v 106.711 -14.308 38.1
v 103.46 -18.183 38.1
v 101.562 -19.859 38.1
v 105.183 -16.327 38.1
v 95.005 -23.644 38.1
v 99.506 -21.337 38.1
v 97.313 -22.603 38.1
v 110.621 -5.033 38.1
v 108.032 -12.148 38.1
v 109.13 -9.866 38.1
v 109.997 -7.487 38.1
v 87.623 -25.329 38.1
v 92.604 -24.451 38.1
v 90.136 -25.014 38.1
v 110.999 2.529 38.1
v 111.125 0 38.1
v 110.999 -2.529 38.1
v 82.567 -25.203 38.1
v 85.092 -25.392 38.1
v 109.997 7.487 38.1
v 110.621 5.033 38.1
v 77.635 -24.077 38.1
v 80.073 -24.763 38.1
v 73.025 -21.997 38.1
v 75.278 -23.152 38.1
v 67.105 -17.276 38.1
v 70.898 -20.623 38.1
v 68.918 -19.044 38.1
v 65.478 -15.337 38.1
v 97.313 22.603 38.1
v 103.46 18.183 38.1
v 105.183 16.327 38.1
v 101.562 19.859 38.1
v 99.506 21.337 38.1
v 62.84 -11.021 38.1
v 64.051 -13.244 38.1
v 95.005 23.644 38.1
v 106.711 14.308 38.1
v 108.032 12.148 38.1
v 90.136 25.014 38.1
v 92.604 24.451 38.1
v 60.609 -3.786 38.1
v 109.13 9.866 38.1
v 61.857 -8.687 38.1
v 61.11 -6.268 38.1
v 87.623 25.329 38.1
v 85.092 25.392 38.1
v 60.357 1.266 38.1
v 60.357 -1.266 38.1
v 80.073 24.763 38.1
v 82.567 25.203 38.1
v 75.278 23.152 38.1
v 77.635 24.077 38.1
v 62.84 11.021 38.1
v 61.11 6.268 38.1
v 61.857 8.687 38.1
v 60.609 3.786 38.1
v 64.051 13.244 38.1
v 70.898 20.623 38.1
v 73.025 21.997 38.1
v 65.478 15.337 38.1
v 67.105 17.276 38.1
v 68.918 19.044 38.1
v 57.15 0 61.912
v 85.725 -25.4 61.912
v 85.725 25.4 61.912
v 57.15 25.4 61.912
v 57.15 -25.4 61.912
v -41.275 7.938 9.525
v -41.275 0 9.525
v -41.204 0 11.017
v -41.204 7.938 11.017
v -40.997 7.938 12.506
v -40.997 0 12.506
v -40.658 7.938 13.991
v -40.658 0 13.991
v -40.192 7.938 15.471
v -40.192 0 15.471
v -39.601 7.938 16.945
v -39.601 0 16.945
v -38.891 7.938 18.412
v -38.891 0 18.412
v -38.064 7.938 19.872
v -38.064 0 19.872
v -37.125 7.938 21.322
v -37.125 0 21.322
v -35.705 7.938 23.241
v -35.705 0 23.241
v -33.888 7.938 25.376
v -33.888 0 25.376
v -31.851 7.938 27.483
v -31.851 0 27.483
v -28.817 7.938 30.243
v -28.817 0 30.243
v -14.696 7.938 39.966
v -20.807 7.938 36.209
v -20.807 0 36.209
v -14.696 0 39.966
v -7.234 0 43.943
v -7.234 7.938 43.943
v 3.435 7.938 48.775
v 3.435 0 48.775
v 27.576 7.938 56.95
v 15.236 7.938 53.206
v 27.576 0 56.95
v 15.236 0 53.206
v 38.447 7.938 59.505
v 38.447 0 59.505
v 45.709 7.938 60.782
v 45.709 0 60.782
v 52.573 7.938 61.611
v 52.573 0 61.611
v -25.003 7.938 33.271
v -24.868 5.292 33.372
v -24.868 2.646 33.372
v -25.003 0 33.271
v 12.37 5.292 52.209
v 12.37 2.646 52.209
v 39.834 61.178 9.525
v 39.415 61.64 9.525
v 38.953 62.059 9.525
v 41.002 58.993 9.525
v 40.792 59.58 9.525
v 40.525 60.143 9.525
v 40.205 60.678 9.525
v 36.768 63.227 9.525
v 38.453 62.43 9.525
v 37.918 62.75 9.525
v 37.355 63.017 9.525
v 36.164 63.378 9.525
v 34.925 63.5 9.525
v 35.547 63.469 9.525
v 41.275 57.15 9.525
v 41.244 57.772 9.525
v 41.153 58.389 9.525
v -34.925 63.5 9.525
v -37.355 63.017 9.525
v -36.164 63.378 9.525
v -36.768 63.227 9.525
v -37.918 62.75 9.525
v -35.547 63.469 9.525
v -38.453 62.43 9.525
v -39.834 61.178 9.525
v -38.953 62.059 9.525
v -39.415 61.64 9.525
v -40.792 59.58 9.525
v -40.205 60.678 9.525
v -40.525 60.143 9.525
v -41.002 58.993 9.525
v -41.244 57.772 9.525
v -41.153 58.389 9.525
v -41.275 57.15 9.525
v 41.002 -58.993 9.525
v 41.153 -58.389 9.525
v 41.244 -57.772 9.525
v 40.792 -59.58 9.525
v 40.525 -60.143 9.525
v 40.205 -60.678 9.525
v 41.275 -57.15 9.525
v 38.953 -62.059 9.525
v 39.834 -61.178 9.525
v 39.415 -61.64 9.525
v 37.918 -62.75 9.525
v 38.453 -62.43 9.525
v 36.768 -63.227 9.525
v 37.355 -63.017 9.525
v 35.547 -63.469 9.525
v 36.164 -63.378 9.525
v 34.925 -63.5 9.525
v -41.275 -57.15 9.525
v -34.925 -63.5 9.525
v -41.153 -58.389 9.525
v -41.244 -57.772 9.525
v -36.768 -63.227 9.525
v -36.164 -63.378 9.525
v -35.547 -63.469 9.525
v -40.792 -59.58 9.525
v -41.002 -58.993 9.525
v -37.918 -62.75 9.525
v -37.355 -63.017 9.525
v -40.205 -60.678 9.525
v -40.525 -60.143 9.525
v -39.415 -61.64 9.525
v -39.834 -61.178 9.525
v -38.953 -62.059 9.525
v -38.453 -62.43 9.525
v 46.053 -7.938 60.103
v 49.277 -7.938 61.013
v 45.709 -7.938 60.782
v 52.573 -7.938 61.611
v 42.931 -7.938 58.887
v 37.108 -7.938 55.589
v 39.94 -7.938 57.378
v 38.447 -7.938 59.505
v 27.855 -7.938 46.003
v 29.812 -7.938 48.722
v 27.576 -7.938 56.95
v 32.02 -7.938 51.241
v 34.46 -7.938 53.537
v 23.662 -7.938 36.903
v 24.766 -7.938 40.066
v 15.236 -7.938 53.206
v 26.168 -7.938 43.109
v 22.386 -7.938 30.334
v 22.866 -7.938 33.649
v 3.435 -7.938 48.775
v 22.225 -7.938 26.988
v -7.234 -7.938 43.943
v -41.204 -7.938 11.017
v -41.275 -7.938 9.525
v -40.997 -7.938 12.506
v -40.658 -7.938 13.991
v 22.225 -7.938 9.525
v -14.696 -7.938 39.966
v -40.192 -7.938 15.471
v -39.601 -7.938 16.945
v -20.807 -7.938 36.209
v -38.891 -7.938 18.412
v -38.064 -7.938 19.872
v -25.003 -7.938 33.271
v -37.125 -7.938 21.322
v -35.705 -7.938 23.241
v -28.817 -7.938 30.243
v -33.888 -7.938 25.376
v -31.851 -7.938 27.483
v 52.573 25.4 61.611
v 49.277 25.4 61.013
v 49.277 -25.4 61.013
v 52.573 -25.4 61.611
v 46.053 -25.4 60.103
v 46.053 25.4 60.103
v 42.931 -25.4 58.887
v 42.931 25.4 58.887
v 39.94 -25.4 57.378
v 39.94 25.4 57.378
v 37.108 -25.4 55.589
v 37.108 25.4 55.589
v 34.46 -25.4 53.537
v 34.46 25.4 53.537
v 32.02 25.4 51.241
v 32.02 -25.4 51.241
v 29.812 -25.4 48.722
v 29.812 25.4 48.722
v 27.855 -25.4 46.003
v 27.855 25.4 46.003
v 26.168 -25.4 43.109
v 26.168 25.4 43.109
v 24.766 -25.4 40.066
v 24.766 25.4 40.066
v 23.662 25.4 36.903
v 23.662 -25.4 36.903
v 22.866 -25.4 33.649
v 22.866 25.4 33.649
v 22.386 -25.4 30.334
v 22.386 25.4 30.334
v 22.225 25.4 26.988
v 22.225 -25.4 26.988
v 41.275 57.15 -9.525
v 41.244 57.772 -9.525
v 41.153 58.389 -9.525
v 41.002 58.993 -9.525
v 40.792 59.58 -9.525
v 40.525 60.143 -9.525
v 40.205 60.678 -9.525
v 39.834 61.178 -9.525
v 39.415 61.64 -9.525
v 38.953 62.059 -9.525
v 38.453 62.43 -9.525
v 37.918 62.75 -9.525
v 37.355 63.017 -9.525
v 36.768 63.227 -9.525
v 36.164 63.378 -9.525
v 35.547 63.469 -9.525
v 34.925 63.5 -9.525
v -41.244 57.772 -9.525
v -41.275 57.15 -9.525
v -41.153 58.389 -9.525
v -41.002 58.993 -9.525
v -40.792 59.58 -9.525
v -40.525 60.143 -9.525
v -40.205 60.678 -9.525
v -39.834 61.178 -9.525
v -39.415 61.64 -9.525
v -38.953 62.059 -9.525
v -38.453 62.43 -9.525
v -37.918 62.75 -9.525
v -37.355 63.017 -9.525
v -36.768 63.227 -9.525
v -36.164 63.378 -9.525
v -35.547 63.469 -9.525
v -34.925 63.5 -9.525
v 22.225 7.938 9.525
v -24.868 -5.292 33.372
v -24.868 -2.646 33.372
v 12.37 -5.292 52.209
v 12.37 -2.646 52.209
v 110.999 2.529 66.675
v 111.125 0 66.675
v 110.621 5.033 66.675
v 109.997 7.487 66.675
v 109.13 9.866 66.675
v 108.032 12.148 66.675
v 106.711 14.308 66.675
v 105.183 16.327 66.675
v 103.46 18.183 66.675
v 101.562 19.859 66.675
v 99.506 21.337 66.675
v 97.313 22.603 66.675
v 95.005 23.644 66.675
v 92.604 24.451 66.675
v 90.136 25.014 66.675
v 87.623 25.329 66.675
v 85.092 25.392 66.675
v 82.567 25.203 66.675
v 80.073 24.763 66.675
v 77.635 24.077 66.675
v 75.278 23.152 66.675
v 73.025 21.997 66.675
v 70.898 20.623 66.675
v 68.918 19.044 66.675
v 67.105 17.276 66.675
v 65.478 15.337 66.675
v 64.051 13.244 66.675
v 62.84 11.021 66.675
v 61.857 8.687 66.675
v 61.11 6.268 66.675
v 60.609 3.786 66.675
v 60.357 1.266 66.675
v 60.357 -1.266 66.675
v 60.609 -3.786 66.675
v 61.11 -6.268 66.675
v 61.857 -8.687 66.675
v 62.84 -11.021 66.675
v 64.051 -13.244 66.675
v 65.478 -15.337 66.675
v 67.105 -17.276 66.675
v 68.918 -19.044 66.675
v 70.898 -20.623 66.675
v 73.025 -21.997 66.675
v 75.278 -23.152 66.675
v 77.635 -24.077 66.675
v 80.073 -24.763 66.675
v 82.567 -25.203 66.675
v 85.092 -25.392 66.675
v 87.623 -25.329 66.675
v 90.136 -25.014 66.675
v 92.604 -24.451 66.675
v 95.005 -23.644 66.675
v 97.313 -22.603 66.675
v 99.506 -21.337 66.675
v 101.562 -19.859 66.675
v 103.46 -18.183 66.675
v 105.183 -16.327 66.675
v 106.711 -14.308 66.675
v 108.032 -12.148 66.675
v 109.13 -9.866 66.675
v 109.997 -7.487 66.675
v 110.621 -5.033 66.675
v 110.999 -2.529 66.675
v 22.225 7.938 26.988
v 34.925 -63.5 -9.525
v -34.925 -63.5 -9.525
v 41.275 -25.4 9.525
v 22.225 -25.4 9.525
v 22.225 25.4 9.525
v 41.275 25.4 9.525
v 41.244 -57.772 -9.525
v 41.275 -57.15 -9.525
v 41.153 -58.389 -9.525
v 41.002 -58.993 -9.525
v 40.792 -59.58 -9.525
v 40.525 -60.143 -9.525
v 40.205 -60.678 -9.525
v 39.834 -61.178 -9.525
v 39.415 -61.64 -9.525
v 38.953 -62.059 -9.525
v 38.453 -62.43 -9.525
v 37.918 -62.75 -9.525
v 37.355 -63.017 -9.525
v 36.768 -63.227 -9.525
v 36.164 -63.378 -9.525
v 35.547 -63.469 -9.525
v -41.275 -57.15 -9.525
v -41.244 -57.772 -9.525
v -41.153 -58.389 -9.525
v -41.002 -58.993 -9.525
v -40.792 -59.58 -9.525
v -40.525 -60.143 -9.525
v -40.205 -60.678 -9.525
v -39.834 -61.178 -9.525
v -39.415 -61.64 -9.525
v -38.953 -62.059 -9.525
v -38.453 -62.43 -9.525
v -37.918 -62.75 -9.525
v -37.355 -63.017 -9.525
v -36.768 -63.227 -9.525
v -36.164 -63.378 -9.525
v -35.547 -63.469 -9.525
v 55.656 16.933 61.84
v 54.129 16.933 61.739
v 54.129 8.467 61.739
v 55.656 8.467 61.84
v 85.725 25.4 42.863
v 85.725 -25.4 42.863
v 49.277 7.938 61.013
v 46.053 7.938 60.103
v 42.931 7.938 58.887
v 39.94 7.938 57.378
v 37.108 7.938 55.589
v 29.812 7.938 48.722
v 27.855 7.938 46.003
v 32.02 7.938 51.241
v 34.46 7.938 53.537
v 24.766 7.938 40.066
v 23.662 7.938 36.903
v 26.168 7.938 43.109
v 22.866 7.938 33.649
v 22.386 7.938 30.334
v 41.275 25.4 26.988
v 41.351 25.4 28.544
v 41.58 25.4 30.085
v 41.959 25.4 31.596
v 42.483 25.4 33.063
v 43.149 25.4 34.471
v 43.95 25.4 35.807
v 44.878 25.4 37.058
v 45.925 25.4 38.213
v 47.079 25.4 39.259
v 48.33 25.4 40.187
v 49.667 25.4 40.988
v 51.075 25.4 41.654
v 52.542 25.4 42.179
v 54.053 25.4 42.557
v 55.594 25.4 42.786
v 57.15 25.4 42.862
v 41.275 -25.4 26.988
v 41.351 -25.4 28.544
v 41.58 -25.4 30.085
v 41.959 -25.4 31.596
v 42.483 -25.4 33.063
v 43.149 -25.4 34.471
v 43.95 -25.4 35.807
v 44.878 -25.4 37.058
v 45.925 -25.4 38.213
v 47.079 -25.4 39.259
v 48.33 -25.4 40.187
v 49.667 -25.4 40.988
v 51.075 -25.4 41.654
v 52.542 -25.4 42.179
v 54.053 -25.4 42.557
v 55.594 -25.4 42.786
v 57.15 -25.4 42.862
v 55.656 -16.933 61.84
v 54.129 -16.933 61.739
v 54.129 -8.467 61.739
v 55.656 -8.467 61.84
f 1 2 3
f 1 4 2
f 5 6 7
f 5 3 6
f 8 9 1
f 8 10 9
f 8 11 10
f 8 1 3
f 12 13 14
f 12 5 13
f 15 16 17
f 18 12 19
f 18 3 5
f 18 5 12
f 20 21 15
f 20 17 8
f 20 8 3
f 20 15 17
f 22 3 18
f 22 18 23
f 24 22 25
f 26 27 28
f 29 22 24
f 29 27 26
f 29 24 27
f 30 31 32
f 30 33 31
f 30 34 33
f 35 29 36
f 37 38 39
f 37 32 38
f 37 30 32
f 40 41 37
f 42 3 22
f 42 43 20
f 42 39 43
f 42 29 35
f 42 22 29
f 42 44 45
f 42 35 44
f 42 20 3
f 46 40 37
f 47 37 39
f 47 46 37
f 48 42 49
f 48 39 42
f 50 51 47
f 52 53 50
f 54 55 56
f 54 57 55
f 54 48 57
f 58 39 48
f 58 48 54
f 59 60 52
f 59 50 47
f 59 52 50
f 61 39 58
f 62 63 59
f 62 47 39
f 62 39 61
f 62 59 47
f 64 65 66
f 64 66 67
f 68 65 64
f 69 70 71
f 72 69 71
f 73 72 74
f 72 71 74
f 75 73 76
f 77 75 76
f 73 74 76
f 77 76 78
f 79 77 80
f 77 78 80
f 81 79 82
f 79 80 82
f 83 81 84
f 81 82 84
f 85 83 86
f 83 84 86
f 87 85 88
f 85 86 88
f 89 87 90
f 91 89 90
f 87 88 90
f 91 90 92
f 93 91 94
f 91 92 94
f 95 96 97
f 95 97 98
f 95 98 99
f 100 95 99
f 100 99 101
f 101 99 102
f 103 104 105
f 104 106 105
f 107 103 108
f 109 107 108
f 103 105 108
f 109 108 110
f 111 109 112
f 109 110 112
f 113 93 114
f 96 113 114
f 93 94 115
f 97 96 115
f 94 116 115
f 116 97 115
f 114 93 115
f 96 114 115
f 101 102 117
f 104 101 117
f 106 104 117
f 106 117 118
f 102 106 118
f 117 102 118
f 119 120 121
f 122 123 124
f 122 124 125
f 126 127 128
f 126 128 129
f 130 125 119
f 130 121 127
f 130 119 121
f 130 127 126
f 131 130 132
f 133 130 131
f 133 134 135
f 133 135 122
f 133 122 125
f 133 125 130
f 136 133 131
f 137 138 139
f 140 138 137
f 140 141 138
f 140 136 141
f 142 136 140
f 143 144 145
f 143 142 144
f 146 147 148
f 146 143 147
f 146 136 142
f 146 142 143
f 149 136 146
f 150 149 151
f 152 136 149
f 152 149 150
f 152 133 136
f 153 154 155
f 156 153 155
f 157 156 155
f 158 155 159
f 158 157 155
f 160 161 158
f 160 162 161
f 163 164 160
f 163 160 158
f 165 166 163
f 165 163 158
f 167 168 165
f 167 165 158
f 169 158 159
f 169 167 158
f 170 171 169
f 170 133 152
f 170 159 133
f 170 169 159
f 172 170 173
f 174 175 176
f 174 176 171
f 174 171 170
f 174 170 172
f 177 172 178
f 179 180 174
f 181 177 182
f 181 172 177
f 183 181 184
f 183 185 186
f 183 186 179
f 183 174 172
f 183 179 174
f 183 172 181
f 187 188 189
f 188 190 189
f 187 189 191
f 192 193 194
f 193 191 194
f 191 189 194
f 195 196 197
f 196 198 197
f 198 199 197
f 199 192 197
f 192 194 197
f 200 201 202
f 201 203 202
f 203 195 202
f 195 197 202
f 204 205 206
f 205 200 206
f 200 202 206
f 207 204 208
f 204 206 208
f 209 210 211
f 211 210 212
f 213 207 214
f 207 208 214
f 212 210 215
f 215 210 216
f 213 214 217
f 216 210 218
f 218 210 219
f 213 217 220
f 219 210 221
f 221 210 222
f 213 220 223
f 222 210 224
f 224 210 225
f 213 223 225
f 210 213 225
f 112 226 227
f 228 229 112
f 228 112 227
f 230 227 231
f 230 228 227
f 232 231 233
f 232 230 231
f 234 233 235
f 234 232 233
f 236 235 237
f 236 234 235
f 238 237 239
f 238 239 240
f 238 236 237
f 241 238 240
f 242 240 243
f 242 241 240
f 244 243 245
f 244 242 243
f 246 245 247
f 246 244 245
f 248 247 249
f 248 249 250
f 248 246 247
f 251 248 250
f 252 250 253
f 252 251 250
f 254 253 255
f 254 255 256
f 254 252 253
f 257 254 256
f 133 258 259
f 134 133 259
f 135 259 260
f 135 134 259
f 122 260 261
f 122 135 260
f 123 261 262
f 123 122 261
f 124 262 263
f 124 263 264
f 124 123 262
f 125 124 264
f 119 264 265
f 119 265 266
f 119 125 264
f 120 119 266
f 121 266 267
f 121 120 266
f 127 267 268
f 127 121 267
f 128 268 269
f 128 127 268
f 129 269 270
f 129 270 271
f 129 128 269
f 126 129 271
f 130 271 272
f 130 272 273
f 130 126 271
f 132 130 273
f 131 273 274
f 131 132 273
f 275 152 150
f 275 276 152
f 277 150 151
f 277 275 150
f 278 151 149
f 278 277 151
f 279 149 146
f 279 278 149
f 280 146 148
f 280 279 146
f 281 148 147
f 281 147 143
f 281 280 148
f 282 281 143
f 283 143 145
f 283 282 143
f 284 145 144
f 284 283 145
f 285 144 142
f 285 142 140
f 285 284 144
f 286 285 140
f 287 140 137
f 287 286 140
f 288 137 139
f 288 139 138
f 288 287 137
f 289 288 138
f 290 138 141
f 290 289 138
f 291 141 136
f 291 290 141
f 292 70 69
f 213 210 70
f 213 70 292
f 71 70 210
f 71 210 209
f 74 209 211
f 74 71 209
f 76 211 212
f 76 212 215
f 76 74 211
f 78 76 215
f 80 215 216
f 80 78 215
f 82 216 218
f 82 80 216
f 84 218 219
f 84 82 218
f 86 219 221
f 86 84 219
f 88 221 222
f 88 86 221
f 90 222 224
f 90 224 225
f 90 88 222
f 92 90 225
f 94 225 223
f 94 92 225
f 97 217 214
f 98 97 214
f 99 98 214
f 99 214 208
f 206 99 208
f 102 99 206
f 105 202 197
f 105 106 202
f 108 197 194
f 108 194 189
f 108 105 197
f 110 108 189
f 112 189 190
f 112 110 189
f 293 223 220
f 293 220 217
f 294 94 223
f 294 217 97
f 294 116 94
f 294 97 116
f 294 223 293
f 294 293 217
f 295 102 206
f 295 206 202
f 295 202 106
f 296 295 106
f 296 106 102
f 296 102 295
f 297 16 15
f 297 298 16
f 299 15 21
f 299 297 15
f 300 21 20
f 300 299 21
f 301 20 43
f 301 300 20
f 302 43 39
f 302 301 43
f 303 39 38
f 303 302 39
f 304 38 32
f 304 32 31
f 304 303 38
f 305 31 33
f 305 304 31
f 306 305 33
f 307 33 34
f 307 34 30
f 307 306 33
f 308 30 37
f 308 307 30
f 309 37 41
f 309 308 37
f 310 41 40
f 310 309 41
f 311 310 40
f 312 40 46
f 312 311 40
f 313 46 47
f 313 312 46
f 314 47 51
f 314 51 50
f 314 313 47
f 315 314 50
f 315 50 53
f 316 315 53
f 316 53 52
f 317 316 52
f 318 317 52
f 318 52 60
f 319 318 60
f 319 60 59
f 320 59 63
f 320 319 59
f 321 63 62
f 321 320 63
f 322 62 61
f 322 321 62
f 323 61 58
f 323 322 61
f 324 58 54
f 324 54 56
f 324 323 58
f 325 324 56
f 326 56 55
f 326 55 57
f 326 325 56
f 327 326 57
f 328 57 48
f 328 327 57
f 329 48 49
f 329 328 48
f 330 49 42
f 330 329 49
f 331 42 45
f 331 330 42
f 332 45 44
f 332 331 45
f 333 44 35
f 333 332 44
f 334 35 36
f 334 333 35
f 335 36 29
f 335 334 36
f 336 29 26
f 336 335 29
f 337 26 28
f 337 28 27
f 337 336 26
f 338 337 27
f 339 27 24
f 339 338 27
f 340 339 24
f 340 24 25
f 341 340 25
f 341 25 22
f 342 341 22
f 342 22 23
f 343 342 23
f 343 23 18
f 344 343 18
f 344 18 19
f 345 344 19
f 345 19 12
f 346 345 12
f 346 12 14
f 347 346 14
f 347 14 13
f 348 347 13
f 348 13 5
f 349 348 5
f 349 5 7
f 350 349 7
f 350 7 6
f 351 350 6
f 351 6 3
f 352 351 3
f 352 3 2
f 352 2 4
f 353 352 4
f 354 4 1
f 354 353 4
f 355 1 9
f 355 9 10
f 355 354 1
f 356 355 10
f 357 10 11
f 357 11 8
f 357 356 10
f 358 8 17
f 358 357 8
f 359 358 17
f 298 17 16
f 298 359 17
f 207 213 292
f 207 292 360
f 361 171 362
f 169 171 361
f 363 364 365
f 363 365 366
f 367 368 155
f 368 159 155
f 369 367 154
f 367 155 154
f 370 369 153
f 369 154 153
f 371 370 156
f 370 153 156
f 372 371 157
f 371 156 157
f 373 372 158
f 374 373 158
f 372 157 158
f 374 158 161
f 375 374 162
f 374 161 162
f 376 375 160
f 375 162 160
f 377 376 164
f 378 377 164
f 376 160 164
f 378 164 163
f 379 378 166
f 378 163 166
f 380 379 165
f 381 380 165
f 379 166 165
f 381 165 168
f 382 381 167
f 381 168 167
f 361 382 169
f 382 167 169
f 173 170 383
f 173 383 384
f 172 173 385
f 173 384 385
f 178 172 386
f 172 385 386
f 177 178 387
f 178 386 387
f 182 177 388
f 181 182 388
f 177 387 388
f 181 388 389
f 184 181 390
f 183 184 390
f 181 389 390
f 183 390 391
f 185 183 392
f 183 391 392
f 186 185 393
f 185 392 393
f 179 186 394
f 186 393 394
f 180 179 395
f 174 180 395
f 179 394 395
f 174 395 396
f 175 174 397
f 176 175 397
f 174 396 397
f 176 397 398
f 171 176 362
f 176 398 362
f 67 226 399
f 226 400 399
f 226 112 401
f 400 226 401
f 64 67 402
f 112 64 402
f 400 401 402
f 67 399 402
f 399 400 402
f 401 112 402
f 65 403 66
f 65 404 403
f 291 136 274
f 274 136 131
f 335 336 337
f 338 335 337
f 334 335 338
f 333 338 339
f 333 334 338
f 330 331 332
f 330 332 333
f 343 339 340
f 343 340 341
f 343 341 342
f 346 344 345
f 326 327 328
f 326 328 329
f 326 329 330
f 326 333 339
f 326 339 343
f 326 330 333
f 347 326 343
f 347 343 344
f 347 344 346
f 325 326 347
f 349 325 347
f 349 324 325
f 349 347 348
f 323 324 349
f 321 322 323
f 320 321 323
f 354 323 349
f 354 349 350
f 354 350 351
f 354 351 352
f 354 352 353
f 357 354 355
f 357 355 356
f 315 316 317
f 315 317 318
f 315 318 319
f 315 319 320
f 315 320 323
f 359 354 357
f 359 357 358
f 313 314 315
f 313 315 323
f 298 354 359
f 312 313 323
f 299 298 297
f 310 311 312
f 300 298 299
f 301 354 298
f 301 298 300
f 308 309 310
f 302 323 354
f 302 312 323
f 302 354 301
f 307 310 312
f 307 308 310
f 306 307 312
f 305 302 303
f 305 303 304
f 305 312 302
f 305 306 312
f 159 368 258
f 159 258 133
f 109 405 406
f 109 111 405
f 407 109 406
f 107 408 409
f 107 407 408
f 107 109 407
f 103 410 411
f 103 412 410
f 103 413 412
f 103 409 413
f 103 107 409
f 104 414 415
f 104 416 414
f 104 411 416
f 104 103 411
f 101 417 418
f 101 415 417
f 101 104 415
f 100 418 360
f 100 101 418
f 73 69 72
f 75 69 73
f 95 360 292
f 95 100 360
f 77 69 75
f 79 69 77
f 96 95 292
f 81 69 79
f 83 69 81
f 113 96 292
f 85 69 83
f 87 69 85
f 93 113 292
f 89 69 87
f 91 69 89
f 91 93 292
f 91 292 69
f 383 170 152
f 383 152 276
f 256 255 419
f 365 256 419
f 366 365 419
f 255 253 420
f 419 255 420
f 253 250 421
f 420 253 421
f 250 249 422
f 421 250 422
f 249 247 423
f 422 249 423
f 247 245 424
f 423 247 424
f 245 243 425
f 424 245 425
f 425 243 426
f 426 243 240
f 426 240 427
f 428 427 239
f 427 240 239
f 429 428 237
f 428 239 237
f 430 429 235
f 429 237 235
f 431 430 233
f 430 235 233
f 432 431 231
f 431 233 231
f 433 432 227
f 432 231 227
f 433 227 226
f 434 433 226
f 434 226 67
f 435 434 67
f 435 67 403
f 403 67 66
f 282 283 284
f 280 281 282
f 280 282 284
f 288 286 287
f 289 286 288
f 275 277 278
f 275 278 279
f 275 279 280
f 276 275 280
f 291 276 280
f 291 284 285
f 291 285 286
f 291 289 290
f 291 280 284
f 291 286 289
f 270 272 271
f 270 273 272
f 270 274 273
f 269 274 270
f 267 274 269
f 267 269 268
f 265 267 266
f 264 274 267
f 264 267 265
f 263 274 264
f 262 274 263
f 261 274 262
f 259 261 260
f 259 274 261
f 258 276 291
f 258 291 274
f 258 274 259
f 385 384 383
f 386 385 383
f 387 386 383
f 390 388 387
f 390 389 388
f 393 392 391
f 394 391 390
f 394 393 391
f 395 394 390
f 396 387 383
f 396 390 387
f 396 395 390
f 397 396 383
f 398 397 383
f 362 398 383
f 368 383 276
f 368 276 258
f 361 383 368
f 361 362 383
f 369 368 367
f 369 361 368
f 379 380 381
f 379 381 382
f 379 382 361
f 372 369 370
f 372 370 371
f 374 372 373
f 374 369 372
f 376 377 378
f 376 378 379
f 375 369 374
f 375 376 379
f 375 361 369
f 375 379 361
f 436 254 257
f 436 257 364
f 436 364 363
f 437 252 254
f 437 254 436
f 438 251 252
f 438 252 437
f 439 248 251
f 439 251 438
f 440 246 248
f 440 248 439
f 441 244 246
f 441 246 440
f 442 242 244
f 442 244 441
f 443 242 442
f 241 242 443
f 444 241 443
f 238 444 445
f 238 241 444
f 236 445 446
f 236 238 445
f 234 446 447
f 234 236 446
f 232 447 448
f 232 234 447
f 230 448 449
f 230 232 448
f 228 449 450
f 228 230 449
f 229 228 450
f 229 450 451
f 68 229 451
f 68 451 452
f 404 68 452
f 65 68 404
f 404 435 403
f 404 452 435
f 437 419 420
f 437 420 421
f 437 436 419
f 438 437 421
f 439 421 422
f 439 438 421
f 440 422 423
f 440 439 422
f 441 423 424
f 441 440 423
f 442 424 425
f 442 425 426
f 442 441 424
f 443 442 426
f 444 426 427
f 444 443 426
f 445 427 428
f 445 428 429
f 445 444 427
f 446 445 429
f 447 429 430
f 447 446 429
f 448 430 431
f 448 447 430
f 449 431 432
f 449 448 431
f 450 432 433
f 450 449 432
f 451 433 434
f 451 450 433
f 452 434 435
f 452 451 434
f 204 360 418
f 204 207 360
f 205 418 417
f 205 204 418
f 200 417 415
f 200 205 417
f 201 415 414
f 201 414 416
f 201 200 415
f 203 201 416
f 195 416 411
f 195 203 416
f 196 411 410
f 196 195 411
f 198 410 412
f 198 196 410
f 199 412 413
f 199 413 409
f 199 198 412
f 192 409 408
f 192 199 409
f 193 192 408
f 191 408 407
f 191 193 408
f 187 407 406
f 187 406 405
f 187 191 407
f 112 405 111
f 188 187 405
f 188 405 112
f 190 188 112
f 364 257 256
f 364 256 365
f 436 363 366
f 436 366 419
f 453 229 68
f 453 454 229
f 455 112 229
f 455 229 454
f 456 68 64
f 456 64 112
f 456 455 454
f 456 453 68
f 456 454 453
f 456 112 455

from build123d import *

# Parameters (mm, degrees)
F1_DEPTH = 63.5
F3_DEPTH = 7.9375
F0_W     = 25.4
F0_H     = 19.05
F4_DEPTH = 25.4
F5_R     = 6.35


with BuildPart() as f1:
    # F0 (on Front) → F1 (new body, symmetric)
    with BuildSketch(Plane.XZ):
        Polygon((22.225, 9.525), (-41.275, 9.525), (-41.275, -9.525), (41.275, -9.525), (41.275, 9.525), align=None)
    extrude(amount=F1_DEPTH, both=True)

    # F5
    f5_edges = [f1.edges().sort_by_distance(p)[0] for p in [
        (41.275, -63.5, 0),
        (-41.275, -63.5, 0),
        (41.275, 63.5, 0),
        (-41.275, 63.5, 0),
    ]]
    fillet(f5_edges, radius=F5_R)


with BuildPart() as f2:
    # F0 (on Front) → F2 (revolve)
    with BuildSketch(Plane.XZ):
        Polygon((85.725, 66.675), (85.725, 61.9125), (85.725, 42.8625), (85.725, 38.1), (111.125, 38.1), (111.125, 66.675), align=None)
    revolve(axis=Axis((85.725, 0, 52.3875), (0, 0, 1)))


with BuildPart() as f3:
    # F0 (on Front) → F3 (new body, symmetric)
    with BuildSketch(Plane.XZ):
        with BuildLine():
            add(Edge.make_bspline(
                [(-41.275, 9.525), (-41.23707723, 34.4016500287), (16.8415314076, 58.4008542063), (52.5728901925, 61.6112734918)],
                knots=[0, 0, 0, 0, 106.8022247868, 106.8022247868, 106.8022247868, 106.8022247868], degree=3))
            Line((-41.275, 9.525), (22.225, 9.525))
            Line((22.225, 9.525), (22.225, 26.9875))
            ThreePointArc((22.225, 26.9875), (30.8858496708, 50.0081436158), (52.5728901925, 61.6112734918))
        make_face()
    extrude(amount=F3_DEPTH, both=True)


with BuildPart() as f4:
    # F0 (on Front) → F4 (new body, symmetric)
    with BuildSketch(Plane.XZ):
        with Locations((73.025, 52.3875)):
            Rectangle(F0_W, F0_H)
        with BuildLine():
            Line((22.225, 26.9875), (22.225, 9.525))
            Line((22.225, 9.525), (41.275, 9.525))
            Line((41.275, 9.525), (41.275, 26.9875))
            ThreePointArc((41.275, 26.9875), (45.9246798487, 38.2128201513), (57.15, 42.8625))
            Line((57.15, 42.8625), (60.325, 42.8625))
            Line((60.325, 42.8625), (60.325, 61.9125))
            Line((60.325, 61.9125), (57.15, 61.9125))
            add(Edge.make_bspline(
                [(52.5728901925, 61.6112734918), (54.1440816458, 61.7524431398), (55.6720632016, 61.8534162861), (57.15, 61.9125)],
                knots=[106.8022247868, 106.8022247868, 106.8022247868, 106.8022247868, 111.4985685166, 111.4985685166, 111.4985685166, 111.4985685166], degree=3))
            ThreePointArc((52.5728901925, 61.6112734918), (30.8858496708, 50.0081436158), (22.225, 26.9875))
        make_face()
    extrude(amount=F4_DEPTH, both=True)


solid = Compound([f1.part, f2.part, f3.part, f4.part])
